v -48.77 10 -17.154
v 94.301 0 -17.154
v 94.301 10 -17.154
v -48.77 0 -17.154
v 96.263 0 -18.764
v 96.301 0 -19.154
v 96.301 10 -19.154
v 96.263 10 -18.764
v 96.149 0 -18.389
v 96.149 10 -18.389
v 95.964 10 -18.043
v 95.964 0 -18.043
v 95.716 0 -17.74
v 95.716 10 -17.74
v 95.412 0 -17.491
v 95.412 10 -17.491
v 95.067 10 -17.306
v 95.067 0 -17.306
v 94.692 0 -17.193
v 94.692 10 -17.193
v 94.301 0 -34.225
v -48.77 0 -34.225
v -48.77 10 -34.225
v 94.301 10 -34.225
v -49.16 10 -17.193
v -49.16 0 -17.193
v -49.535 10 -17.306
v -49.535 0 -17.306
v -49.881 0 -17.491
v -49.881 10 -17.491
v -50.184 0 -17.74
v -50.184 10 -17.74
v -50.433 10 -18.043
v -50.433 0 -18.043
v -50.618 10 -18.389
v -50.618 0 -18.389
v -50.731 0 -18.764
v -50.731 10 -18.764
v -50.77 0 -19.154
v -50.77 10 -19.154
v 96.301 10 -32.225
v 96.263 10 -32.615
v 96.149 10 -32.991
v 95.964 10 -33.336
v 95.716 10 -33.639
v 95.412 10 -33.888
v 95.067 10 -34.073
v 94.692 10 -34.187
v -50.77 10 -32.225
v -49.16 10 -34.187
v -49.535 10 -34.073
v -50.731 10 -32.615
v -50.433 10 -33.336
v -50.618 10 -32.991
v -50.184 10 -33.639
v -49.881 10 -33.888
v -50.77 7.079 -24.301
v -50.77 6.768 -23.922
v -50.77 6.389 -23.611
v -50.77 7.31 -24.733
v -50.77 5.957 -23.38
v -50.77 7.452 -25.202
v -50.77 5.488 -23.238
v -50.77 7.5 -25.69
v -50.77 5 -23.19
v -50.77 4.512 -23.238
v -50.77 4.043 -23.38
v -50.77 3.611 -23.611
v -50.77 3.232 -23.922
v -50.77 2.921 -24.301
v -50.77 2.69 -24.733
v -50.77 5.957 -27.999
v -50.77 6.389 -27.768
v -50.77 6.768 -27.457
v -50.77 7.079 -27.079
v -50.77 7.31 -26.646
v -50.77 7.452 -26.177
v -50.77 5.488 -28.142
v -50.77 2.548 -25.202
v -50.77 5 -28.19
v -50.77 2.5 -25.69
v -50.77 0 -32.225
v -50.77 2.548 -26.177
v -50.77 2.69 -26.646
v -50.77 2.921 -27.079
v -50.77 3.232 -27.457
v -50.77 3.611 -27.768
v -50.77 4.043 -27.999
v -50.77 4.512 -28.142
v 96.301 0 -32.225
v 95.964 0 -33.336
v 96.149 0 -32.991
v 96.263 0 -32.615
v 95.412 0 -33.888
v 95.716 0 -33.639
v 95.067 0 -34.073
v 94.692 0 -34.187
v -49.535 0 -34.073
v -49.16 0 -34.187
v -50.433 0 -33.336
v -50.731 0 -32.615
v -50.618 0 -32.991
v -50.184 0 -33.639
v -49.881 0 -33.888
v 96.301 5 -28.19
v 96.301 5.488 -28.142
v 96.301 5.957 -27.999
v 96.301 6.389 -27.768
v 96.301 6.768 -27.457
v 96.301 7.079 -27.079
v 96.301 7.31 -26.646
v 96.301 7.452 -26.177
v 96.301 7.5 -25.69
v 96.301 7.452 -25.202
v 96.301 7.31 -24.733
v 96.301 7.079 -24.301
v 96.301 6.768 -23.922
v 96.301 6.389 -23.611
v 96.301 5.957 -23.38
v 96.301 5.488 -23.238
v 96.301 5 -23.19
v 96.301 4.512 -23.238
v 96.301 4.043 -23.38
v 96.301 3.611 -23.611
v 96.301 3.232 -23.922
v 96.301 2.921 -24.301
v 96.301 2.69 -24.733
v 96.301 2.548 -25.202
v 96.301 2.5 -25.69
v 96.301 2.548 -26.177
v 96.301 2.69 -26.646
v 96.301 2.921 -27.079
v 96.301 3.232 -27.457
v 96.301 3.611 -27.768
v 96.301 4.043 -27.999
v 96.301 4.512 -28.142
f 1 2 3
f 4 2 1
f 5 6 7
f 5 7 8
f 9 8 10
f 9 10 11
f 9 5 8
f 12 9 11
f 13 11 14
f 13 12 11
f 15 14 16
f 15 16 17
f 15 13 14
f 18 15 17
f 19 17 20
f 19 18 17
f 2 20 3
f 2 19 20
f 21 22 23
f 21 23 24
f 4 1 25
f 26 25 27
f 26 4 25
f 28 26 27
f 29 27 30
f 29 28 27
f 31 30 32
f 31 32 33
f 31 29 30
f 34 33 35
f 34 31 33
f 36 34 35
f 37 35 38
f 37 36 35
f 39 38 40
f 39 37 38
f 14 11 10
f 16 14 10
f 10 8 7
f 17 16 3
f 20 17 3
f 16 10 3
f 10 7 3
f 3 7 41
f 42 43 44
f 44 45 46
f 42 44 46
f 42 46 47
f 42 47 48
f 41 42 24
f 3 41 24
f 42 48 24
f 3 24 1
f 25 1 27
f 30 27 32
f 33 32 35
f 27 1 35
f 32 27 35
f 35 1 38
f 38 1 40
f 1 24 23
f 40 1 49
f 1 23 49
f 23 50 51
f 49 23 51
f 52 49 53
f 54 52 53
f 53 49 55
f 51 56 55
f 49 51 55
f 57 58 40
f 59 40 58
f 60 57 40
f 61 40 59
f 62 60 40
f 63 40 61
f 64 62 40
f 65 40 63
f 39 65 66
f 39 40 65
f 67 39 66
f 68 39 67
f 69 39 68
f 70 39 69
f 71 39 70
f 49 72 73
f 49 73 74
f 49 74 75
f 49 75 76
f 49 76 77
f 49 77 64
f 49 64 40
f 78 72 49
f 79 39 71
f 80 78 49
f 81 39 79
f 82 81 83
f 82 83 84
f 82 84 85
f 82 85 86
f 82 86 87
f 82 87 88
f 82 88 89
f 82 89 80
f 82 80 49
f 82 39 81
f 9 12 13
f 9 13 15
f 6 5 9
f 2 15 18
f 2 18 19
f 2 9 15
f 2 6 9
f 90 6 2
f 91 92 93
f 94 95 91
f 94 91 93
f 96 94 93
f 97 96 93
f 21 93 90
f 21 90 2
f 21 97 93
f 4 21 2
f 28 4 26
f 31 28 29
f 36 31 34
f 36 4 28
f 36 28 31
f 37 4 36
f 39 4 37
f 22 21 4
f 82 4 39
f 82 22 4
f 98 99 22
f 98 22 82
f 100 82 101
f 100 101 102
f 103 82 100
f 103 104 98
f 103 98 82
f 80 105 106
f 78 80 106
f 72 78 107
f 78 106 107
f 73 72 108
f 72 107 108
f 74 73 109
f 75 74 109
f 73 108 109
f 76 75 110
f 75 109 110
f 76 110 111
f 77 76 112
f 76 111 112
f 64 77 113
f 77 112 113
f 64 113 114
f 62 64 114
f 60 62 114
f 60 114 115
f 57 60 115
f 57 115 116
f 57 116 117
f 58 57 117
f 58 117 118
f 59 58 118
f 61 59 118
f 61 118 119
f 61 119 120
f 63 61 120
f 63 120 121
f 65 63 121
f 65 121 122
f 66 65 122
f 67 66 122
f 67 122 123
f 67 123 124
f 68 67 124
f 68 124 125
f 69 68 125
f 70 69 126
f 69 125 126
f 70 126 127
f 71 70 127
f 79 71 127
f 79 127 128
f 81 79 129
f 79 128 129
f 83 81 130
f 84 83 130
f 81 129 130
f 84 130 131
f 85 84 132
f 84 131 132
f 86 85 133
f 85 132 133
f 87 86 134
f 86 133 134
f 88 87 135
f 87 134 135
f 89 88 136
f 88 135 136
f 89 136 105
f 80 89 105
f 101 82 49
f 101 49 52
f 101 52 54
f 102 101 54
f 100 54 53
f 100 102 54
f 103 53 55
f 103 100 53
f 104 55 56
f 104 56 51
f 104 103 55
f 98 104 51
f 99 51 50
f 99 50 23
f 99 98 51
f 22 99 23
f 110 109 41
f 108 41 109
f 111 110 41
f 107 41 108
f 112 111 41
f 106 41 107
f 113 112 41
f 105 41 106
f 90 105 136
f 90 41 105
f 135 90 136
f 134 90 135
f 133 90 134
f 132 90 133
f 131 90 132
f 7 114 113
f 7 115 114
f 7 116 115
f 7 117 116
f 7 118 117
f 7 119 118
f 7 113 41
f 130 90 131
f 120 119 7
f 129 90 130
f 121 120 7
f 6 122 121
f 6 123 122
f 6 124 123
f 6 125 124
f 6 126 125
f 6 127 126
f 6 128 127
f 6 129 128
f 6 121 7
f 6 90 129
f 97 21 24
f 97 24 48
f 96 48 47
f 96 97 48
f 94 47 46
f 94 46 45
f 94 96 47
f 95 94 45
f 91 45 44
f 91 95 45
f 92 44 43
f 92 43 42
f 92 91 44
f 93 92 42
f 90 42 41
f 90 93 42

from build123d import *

# Parameters (mm, degrees)
Y_KSEKLIK_EKSTR_ZYON1_DEPTH = 10
IZIM2_R                     = 2.5
KES_EKSTR_ZYON1_DEPTH       = 170


with BuildPart() as part:
    # Çizim1 → Yükseklik-Ekstrüzyon1 (new body)
    with BuildSketch(Plane(origin=(0, 0, 0), x_dir=(1, 0, 0), z_dir=(0, 1, 0))):
        with BuildLine():
            Line((-48.769745033, 34.22514167), (94.301322779, 34.22514167))
            ThreePointArc((94.301322779, 34.22514167), (95.715536341, 33.639355233), (96.301322779, 32.22514167))
            Line((96.301322779, 32.22514167), (96.301322779, 19.154073858))
            ThreePointArc((96.301322779, 19.154073858), (95.715536341, 17.739860296), (94.301322779, 17.154073858))
            Line((94.301322779, 17.154073858), (-48.769745033, 17.154073858))
            ThreePointArc((-48.769745033, 17.154073858), (-50.183958595, 17.739860296), (-50.769745033, 19.154073858))
            Line((-50.769745033, 19.154073858), (-50.769745033, 32.22514167))
            ThreePointArc((-50.769745033, 32.22514167), (-50.183958595, 33.639355233), (-48.769745033, 34.22514167))
        make_face()
    extrude(amount=Y_KSEKLIK_EKSTR_ZYON1_DEPTH)

    # Çizim2 → Kes-Ekstrüzyon1 (cut)
    with BuildSketch(Plane(origin=(96.301322779, 0, 0), x_dir=(0, 0, -1), z_dir=(1, 0, 0))):
        with Locations((25.689607764, 5)):
            Circle(IZIM2_R)
    extrude(amount=-KES_EKSTR_ZYON1_DEPTH, mode=Mode.SUBTRACT)


solid = part.part
